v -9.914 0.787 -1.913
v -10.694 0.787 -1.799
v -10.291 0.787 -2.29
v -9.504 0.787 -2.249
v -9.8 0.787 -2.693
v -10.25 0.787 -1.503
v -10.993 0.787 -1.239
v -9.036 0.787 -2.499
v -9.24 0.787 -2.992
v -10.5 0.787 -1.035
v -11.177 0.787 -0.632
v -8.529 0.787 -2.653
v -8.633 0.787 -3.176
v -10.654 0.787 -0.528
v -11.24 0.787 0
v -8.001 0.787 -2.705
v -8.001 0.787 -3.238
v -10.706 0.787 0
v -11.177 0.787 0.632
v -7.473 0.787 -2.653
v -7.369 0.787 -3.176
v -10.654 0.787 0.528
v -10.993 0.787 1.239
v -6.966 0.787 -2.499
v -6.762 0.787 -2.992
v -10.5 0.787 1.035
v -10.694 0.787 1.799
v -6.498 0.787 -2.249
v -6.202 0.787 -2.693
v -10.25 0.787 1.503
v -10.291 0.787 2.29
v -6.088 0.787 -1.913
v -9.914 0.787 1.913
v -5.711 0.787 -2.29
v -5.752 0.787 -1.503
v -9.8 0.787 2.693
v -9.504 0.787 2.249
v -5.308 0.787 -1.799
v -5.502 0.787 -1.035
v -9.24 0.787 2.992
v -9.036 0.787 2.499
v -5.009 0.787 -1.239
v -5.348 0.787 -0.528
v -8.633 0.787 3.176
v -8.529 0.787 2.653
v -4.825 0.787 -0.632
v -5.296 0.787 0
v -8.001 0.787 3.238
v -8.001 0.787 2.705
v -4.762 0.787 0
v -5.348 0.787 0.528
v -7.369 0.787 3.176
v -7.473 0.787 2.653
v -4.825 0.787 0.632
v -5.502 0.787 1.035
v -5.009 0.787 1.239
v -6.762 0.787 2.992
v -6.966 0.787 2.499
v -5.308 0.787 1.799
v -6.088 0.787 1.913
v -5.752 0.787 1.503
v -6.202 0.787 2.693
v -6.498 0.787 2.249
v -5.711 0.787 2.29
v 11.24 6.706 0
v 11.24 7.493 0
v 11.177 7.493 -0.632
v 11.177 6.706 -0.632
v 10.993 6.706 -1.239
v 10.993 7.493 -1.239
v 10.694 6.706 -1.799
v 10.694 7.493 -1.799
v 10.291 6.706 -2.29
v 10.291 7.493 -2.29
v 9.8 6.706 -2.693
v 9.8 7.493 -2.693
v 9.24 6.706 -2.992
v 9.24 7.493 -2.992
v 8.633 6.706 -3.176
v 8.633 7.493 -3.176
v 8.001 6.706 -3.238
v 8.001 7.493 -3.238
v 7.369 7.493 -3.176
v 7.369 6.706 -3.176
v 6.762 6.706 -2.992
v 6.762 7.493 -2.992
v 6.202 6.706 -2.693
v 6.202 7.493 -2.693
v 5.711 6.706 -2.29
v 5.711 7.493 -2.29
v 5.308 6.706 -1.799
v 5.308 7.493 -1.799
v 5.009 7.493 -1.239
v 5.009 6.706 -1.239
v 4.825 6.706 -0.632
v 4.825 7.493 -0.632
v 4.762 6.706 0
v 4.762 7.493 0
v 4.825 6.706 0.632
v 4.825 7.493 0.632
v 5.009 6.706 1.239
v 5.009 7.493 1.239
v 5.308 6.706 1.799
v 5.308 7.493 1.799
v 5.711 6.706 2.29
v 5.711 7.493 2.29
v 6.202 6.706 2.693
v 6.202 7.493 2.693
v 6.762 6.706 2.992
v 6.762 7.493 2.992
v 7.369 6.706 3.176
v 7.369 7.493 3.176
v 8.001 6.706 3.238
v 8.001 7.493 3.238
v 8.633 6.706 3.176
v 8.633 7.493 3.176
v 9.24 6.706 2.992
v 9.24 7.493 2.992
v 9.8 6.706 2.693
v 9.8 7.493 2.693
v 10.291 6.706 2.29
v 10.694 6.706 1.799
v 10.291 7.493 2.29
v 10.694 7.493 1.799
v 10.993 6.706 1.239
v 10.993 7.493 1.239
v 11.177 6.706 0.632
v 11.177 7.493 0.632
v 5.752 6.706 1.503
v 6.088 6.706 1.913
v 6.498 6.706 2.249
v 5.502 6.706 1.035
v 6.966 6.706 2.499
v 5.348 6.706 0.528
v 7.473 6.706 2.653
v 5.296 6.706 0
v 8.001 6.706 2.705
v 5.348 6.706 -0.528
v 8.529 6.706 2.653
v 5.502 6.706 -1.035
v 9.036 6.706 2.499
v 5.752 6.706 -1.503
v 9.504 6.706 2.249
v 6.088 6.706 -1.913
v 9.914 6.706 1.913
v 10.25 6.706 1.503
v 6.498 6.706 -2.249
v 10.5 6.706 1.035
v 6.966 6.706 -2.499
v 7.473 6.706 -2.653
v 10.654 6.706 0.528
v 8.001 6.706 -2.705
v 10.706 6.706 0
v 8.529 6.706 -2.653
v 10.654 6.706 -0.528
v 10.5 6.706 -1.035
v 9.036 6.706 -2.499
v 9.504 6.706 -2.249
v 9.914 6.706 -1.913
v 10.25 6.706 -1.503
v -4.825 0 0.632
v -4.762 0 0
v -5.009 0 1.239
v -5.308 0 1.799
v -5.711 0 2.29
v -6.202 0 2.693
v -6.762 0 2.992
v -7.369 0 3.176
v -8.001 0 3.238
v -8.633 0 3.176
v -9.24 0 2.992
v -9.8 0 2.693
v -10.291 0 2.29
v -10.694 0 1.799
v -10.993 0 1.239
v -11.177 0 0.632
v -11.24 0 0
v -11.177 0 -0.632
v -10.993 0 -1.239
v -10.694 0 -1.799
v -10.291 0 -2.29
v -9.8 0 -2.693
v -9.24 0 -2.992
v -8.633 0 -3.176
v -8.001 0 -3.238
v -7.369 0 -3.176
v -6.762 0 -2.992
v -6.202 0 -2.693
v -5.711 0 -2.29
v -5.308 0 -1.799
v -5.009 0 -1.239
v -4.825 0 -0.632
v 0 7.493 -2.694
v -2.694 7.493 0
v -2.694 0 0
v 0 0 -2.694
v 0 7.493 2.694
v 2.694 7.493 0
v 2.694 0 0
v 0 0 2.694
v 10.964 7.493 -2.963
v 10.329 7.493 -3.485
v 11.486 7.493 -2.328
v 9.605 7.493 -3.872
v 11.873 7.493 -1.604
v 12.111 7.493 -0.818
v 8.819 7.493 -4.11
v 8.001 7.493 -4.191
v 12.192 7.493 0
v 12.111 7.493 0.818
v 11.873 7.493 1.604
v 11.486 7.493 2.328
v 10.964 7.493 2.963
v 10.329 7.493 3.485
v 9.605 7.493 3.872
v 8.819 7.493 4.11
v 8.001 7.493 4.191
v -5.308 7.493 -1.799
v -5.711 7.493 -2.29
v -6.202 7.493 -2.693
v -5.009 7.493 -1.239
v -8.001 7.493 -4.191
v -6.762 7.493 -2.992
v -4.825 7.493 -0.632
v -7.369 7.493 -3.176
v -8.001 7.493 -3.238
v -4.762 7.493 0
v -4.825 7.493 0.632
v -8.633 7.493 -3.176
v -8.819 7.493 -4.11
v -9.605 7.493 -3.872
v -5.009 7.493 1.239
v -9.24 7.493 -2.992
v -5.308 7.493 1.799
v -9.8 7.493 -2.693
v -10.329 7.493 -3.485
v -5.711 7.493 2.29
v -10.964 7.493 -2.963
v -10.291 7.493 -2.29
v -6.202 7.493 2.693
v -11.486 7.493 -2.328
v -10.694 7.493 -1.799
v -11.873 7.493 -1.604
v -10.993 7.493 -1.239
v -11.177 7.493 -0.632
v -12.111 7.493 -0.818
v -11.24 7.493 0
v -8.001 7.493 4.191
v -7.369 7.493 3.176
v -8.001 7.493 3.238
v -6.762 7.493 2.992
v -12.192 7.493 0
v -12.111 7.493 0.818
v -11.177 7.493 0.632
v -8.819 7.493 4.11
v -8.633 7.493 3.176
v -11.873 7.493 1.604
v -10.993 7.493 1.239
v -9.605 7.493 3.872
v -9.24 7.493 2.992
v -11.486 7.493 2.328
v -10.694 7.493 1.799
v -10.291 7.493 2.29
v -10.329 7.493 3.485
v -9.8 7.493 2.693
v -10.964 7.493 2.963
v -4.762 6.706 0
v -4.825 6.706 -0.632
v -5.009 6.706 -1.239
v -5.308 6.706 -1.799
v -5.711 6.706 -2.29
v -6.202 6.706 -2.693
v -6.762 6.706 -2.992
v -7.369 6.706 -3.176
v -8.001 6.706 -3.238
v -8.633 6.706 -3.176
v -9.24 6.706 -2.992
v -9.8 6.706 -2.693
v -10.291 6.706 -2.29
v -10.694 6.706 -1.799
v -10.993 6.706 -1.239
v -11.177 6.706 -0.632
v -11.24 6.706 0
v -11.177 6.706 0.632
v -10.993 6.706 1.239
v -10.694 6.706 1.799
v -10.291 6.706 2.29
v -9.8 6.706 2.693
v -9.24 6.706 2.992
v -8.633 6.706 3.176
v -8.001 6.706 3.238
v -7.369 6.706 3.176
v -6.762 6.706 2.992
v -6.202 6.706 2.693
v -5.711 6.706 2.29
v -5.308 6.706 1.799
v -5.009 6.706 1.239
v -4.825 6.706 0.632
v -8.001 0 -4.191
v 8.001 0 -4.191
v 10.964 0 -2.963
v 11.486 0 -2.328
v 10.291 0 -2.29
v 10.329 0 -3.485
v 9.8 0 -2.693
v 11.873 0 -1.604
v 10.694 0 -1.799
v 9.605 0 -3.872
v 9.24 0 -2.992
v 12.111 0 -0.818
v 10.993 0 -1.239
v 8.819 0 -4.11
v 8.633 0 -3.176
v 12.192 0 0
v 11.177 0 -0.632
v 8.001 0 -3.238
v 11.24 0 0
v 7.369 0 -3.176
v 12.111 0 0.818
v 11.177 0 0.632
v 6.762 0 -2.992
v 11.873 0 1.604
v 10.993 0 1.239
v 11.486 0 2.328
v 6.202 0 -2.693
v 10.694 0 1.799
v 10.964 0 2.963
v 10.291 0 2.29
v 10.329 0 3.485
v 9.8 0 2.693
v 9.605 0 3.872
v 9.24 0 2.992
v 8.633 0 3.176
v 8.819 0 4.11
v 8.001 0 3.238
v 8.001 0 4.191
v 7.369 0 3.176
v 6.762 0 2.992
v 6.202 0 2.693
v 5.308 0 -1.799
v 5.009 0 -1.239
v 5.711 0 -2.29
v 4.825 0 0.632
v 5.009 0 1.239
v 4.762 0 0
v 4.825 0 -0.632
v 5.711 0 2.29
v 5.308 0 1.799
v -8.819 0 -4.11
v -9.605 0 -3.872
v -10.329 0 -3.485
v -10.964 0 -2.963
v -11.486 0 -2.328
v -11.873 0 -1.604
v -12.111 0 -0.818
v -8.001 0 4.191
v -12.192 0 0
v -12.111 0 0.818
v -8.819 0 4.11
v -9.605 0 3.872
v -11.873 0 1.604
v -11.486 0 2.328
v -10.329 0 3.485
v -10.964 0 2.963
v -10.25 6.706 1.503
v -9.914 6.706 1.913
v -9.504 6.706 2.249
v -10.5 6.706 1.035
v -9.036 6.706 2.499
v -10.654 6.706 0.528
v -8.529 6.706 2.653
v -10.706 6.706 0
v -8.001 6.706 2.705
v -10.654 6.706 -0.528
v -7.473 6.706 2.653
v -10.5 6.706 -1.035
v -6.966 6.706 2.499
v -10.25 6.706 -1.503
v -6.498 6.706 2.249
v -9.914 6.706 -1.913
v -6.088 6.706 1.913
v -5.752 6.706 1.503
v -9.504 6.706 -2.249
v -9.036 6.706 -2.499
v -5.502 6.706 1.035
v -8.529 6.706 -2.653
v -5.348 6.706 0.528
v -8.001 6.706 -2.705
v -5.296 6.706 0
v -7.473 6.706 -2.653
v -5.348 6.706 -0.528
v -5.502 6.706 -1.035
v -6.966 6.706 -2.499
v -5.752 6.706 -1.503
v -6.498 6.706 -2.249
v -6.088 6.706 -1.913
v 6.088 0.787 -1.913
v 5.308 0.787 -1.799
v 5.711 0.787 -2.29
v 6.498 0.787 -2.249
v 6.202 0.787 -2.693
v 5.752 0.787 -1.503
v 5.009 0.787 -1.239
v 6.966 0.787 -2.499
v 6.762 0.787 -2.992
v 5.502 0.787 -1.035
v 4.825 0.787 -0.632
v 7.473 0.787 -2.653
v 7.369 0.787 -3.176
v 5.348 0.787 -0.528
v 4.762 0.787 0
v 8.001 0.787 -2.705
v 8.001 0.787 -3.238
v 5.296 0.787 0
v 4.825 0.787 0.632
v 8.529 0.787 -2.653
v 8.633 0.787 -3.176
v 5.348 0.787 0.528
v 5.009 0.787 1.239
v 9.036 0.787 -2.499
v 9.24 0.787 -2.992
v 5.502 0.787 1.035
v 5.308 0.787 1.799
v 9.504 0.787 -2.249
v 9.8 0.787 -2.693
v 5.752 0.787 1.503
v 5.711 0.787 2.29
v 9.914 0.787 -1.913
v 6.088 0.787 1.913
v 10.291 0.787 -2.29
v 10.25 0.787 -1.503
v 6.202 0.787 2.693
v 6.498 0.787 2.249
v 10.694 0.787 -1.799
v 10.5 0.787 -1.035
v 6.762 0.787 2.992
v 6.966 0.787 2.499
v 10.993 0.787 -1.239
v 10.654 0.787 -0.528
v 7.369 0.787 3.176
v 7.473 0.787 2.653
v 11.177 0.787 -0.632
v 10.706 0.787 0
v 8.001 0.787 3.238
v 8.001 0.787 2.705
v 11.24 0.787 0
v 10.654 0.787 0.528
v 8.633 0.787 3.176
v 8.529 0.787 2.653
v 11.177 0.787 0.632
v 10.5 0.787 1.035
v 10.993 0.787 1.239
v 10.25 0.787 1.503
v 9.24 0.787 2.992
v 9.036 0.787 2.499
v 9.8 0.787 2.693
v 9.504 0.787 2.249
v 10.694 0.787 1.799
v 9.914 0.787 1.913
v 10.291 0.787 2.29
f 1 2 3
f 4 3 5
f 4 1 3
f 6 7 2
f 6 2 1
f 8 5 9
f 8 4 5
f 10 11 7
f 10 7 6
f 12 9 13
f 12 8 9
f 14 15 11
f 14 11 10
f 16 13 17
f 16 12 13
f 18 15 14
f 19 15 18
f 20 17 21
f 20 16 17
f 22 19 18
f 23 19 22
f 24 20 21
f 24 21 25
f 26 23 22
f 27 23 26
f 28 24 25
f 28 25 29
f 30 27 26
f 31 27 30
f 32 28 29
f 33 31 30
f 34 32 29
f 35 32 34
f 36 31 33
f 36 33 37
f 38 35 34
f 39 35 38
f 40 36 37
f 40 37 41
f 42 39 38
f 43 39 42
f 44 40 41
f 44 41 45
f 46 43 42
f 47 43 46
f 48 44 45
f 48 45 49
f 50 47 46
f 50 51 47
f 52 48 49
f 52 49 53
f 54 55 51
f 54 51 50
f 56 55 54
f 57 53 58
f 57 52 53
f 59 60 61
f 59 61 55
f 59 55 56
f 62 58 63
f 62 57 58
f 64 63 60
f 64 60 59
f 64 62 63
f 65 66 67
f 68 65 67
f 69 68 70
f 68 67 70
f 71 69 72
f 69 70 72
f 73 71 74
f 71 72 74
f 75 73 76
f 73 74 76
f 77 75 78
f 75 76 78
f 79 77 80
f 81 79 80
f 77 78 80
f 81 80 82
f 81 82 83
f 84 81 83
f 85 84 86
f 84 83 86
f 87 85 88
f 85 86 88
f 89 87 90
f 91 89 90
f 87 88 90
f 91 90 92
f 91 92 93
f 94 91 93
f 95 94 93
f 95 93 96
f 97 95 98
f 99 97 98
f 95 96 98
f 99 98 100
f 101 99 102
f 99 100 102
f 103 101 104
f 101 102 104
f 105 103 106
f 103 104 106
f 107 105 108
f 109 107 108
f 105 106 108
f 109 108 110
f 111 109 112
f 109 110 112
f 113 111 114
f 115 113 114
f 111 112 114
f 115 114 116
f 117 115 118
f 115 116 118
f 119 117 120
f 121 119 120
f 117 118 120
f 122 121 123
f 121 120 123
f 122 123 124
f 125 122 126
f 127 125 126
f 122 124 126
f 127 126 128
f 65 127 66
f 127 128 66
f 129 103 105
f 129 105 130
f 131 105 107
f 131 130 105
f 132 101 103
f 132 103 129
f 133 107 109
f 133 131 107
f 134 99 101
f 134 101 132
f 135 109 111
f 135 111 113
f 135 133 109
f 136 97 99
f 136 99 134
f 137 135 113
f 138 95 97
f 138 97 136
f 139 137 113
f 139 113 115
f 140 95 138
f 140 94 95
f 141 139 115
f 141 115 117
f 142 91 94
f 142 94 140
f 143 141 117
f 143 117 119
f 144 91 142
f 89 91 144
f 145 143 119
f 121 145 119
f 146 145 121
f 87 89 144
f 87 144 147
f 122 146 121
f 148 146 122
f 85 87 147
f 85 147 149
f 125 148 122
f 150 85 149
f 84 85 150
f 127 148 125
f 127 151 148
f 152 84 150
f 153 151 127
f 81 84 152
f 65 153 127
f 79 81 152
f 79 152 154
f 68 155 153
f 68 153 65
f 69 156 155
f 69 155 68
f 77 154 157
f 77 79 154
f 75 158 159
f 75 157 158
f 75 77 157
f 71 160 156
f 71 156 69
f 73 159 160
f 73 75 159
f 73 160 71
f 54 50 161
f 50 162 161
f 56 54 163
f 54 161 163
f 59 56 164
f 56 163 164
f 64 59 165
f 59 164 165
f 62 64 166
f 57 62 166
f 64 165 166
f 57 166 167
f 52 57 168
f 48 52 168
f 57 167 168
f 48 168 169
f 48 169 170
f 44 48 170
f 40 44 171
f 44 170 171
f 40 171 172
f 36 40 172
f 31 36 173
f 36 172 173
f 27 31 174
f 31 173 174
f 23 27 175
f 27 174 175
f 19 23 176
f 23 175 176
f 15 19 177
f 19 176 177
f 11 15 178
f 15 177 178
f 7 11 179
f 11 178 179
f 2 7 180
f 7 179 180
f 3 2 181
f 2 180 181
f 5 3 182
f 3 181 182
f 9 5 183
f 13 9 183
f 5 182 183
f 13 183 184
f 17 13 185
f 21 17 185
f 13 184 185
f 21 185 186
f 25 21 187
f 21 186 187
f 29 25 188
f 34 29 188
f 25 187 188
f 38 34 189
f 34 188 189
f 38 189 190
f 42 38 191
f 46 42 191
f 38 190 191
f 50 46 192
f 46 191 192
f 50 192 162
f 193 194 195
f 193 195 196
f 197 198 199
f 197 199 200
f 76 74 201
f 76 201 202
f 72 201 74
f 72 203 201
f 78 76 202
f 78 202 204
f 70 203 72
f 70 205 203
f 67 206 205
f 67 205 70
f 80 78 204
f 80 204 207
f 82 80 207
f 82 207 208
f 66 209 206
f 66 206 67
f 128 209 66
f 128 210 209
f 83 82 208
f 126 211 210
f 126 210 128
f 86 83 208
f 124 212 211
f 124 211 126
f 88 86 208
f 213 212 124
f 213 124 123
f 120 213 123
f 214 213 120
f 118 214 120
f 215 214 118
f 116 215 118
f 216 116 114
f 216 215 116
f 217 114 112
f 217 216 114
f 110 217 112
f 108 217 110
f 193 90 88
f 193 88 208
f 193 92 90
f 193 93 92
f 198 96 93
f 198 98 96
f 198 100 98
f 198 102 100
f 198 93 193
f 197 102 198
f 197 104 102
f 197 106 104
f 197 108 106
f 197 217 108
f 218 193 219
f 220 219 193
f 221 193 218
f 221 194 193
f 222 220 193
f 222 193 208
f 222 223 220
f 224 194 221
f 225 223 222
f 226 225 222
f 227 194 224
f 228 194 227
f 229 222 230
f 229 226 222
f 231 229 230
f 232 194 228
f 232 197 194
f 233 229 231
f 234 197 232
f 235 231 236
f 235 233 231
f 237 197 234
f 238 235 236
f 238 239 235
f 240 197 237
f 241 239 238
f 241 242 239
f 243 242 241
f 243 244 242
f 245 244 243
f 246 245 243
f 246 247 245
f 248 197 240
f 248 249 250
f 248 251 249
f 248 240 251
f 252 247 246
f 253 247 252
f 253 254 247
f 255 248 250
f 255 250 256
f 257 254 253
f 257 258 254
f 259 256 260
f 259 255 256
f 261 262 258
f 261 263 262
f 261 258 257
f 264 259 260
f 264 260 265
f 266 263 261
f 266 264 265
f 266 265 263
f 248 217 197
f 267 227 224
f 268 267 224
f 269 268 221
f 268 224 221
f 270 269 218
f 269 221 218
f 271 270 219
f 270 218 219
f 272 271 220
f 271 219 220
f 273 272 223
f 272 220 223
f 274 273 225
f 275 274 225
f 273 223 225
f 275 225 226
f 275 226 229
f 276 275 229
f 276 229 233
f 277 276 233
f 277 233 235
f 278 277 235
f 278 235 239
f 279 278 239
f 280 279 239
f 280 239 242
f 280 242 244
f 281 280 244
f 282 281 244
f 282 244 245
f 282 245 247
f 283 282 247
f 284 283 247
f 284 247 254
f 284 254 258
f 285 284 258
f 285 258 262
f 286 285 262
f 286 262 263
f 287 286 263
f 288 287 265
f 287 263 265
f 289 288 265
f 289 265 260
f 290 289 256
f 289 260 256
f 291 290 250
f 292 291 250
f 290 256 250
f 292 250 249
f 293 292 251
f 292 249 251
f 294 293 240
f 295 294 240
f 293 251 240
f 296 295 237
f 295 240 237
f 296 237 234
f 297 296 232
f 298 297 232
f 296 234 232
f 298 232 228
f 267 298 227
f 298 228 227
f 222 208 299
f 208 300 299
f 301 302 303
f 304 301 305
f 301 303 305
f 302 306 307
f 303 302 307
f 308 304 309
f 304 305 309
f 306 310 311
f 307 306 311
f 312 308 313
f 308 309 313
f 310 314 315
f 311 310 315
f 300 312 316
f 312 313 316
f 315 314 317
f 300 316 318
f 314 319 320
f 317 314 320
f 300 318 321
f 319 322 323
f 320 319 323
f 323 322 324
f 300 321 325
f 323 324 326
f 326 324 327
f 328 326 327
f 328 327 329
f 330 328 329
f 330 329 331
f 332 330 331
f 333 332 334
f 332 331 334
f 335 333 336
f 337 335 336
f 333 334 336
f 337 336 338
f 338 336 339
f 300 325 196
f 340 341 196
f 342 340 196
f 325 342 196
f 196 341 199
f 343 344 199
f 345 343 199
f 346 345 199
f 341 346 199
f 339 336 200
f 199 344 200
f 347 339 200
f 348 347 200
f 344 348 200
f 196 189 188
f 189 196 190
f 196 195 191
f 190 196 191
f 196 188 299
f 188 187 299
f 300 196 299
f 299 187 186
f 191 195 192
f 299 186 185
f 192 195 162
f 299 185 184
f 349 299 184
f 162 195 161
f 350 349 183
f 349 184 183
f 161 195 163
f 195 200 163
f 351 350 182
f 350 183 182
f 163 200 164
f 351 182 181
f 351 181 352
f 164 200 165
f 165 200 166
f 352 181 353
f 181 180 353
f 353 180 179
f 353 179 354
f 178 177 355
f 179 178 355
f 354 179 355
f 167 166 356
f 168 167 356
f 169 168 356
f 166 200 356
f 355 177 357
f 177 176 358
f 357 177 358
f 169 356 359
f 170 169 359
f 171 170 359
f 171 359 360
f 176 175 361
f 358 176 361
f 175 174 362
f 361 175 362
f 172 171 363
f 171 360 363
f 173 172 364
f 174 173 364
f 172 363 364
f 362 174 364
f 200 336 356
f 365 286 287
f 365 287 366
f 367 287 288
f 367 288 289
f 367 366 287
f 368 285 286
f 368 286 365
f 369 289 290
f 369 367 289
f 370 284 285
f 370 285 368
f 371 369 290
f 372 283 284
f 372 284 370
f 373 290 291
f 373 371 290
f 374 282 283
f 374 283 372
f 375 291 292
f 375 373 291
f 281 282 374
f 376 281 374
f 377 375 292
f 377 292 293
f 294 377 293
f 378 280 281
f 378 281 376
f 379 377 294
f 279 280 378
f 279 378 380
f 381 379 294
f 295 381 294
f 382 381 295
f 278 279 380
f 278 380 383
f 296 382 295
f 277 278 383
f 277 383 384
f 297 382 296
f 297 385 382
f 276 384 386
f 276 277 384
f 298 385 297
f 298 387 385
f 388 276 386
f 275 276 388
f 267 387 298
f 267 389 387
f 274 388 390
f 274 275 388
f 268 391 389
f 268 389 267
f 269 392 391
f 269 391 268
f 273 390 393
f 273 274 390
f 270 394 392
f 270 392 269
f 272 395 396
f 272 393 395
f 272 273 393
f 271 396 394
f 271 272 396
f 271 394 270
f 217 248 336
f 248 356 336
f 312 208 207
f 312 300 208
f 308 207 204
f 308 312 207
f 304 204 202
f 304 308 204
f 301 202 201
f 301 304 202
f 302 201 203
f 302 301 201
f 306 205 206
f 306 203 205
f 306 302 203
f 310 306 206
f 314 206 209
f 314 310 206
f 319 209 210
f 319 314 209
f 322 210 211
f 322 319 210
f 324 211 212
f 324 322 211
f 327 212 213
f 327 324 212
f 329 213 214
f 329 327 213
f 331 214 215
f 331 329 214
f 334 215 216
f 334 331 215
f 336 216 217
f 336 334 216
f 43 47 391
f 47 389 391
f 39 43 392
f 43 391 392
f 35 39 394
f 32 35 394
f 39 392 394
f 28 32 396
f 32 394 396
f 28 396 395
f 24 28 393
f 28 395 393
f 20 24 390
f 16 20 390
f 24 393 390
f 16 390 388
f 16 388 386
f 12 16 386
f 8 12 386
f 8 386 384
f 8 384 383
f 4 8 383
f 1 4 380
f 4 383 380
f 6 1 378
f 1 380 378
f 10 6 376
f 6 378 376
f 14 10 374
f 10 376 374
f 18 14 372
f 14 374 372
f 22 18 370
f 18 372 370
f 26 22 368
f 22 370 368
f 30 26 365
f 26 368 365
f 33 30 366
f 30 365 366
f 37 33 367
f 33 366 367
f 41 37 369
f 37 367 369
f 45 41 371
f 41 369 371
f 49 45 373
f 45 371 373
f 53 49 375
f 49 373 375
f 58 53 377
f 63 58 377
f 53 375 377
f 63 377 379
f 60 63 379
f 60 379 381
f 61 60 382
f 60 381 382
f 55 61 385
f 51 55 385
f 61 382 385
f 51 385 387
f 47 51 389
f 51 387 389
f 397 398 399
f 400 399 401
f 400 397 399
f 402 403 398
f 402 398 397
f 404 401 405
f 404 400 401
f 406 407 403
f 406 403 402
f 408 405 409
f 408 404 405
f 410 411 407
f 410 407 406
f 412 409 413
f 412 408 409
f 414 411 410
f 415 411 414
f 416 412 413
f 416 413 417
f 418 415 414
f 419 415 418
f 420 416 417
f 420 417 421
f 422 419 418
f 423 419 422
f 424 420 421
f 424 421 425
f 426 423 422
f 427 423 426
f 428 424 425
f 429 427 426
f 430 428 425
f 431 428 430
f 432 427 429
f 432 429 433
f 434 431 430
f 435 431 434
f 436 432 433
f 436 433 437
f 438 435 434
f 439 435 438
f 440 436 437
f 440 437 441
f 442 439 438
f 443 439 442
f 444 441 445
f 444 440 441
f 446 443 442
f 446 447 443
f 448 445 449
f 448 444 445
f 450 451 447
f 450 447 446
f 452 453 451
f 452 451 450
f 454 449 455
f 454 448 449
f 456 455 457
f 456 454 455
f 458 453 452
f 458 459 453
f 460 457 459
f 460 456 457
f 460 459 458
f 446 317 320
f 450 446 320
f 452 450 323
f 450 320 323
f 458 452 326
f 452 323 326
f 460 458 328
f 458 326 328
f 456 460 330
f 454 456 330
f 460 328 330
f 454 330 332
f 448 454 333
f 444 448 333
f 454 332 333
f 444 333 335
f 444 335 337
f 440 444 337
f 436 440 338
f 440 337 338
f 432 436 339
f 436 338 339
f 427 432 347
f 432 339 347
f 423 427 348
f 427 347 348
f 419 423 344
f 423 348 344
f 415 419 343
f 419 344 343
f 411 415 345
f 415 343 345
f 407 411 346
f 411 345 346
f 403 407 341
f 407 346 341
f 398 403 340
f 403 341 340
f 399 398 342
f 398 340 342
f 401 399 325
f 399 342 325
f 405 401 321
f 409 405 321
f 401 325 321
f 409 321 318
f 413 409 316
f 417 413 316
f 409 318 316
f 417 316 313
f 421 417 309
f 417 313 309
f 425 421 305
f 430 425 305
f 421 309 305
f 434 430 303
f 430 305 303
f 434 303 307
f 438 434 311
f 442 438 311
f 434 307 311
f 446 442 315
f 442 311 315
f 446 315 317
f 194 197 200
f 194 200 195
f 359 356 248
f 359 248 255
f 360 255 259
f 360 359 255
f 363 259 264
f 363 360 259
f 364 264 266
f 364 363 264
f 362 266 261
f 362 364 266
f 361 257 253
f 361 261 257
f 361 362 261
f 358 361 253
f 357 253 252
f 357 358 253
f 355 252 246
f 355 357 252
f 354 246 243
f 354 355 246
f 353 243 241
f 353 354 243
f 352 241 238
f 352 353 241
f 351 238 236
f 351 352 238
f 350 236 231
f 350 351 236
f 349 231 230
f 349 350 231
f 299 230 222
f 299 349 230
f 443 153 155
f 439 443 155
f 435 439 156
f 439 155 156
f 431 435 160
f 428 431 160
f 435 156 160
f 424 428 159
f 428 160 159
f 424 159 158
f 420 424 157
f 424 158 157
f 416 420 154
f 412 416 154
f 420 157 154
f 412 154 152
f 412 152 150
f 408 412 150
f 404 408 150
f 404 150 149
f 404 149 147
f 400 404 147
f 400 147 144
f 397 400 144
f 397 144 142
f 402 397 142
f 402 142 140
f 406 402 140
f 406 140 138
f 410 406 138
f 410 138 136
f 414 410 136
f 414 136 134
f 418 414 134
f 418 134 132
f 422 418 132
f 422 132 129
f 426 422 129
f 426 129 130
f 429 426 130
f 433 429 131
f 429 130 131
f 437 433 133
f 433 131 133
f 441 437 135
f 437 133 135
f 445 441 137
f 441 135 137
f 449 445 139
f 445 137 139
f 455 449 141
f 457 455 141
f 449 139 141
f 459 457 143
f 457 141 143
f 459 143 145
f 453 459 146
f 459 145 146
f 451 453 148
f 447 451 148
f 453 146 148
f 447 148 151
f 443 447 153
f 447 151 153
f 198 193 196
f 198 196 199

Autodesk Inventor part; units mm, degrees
ref_plane "YZ Plane" through (0, 0, 0) normal (1, 0, 0) x (0, 1, 0)
ref_plane "XZ Plane" through (0, 0, 0) normal (0, 1, 0) x (-1, 0, 0)
ref_plane "XY Plane" through (0, 0, 0) normal (0, 0, 1) x (1, 0, 0)
sketch "Sketch1" plane through (0, 0, 0) normal (0, 1, 0) x (-1, 0, 0)
  line L0 (-8.001, 0) -> (8.001, 0) construction
  line L1 (-8.001, -4.191) -> (8.001, -4.191)
  line L2 (8.001, 4.191) -> (-8.001, 4.191)
  arc A0 (-8.001, 4.191) -> (-8.001, -4.191) centre (-8.001, 0) ccw
  arc A1 (8.001, -4.191) -> (8.001, 4.191) centre (8.001, 0) ccw
  line L3 (-2.6941, 0) -> (0, 2.6941)
  line L4 (0, 2.6941) -> (2.6941, 0)
  line L5 (2.6941, 0) -> (0, -2.6941)
  line L6 (0, -2.6941) -> (-2.6941, 0)
  line L7 (-2.6941, 0) -> (2.6941, 0) construction
  line L8 (0, 2.6941) -> (0, -2.6941) construction
  point P0 (0, 0)
  dimension "d0" = 8.001
  dimension "d1" = 8.382
  dimension "d2" = 3.81
  dimension "d3" = 3.81
extrude "Extrusion1" add sketch "Sketch1" along normal blind 7.493
sketch "Sketch2" plane through (0, 7.493, 0) normal (0, 1, 0) x (1, 0, 0)
  circle A0 centre (-8.001, 0) radius 3.2385
  point P0 (0, 0)
  dimension "d6" = 8.001
  dimension "d7" = 6.477
extrude "Extrusion2" cut sketch "Sketch2" against normal blind 0.7874
sketch "Sketch3" plane through (0, 7.493, 0) normal (0, 1, 0) x (1, 0, 0)
  circle A0 centre (8.001, 0) radius 3.2385
  point P0 (0, 0)
  dimension "d10" = 8.001
  dimension "d11" = 6.477
extrude "Extrusion3" cut sketch "Sketch3" against normal blind 0.7874
sketch "Sketch4" plane through (0, 0, 0) normal (0, -1, 0) x (1, 0, 0)
  circle A0 centre (8.001, 0) radius 3.2385 projected
  circle A1 centre (8.001, 0) radius 2.8575
  point P0 (0, 0)
extrude "Extrusion4" cut sketch "Sketch4" against normal blind 0.7874 contours A0 | A1
sketch "Sketch5" plane through (0, 0, 0) normal (0, -1, 0) x (1, 0, 0)
  circle A0 centre (-8.001, 0) radius 3.2385 projected
  circle A1 centre (-8.001, 0) radius 2.8575
  point P0 (0, 0)
extrude "Extrusion5" cut sketch "Sketch5" against normal blind 0.7874 contours A0 | A1
sketch "Sketch6" plane through (-8.001, 6.7056, 0) normal (0, 1, 0) x (1, 0, 0)
  circle A0 centre (0, 0) radius 2.7051
  point P0 (8.001, 0)
  dimension "d18" = 5.4102
extrude "Extrusion6" cut sketch "Sketch6" against normal through all
sketch "Sketch7" plane through (8.001, 6.7056, 0) normal (0, 1, 0) x (1, 0, 0)
  circle A0 centre (0, 0) radius 2.7051
  point P0 (-8.001, 0)
  dimension "d21" = 5.4102
extrude "Extrusion7" cut sketch "Sketch7" against normal through all
properties part number "VexLegoBiggerCoupler"
